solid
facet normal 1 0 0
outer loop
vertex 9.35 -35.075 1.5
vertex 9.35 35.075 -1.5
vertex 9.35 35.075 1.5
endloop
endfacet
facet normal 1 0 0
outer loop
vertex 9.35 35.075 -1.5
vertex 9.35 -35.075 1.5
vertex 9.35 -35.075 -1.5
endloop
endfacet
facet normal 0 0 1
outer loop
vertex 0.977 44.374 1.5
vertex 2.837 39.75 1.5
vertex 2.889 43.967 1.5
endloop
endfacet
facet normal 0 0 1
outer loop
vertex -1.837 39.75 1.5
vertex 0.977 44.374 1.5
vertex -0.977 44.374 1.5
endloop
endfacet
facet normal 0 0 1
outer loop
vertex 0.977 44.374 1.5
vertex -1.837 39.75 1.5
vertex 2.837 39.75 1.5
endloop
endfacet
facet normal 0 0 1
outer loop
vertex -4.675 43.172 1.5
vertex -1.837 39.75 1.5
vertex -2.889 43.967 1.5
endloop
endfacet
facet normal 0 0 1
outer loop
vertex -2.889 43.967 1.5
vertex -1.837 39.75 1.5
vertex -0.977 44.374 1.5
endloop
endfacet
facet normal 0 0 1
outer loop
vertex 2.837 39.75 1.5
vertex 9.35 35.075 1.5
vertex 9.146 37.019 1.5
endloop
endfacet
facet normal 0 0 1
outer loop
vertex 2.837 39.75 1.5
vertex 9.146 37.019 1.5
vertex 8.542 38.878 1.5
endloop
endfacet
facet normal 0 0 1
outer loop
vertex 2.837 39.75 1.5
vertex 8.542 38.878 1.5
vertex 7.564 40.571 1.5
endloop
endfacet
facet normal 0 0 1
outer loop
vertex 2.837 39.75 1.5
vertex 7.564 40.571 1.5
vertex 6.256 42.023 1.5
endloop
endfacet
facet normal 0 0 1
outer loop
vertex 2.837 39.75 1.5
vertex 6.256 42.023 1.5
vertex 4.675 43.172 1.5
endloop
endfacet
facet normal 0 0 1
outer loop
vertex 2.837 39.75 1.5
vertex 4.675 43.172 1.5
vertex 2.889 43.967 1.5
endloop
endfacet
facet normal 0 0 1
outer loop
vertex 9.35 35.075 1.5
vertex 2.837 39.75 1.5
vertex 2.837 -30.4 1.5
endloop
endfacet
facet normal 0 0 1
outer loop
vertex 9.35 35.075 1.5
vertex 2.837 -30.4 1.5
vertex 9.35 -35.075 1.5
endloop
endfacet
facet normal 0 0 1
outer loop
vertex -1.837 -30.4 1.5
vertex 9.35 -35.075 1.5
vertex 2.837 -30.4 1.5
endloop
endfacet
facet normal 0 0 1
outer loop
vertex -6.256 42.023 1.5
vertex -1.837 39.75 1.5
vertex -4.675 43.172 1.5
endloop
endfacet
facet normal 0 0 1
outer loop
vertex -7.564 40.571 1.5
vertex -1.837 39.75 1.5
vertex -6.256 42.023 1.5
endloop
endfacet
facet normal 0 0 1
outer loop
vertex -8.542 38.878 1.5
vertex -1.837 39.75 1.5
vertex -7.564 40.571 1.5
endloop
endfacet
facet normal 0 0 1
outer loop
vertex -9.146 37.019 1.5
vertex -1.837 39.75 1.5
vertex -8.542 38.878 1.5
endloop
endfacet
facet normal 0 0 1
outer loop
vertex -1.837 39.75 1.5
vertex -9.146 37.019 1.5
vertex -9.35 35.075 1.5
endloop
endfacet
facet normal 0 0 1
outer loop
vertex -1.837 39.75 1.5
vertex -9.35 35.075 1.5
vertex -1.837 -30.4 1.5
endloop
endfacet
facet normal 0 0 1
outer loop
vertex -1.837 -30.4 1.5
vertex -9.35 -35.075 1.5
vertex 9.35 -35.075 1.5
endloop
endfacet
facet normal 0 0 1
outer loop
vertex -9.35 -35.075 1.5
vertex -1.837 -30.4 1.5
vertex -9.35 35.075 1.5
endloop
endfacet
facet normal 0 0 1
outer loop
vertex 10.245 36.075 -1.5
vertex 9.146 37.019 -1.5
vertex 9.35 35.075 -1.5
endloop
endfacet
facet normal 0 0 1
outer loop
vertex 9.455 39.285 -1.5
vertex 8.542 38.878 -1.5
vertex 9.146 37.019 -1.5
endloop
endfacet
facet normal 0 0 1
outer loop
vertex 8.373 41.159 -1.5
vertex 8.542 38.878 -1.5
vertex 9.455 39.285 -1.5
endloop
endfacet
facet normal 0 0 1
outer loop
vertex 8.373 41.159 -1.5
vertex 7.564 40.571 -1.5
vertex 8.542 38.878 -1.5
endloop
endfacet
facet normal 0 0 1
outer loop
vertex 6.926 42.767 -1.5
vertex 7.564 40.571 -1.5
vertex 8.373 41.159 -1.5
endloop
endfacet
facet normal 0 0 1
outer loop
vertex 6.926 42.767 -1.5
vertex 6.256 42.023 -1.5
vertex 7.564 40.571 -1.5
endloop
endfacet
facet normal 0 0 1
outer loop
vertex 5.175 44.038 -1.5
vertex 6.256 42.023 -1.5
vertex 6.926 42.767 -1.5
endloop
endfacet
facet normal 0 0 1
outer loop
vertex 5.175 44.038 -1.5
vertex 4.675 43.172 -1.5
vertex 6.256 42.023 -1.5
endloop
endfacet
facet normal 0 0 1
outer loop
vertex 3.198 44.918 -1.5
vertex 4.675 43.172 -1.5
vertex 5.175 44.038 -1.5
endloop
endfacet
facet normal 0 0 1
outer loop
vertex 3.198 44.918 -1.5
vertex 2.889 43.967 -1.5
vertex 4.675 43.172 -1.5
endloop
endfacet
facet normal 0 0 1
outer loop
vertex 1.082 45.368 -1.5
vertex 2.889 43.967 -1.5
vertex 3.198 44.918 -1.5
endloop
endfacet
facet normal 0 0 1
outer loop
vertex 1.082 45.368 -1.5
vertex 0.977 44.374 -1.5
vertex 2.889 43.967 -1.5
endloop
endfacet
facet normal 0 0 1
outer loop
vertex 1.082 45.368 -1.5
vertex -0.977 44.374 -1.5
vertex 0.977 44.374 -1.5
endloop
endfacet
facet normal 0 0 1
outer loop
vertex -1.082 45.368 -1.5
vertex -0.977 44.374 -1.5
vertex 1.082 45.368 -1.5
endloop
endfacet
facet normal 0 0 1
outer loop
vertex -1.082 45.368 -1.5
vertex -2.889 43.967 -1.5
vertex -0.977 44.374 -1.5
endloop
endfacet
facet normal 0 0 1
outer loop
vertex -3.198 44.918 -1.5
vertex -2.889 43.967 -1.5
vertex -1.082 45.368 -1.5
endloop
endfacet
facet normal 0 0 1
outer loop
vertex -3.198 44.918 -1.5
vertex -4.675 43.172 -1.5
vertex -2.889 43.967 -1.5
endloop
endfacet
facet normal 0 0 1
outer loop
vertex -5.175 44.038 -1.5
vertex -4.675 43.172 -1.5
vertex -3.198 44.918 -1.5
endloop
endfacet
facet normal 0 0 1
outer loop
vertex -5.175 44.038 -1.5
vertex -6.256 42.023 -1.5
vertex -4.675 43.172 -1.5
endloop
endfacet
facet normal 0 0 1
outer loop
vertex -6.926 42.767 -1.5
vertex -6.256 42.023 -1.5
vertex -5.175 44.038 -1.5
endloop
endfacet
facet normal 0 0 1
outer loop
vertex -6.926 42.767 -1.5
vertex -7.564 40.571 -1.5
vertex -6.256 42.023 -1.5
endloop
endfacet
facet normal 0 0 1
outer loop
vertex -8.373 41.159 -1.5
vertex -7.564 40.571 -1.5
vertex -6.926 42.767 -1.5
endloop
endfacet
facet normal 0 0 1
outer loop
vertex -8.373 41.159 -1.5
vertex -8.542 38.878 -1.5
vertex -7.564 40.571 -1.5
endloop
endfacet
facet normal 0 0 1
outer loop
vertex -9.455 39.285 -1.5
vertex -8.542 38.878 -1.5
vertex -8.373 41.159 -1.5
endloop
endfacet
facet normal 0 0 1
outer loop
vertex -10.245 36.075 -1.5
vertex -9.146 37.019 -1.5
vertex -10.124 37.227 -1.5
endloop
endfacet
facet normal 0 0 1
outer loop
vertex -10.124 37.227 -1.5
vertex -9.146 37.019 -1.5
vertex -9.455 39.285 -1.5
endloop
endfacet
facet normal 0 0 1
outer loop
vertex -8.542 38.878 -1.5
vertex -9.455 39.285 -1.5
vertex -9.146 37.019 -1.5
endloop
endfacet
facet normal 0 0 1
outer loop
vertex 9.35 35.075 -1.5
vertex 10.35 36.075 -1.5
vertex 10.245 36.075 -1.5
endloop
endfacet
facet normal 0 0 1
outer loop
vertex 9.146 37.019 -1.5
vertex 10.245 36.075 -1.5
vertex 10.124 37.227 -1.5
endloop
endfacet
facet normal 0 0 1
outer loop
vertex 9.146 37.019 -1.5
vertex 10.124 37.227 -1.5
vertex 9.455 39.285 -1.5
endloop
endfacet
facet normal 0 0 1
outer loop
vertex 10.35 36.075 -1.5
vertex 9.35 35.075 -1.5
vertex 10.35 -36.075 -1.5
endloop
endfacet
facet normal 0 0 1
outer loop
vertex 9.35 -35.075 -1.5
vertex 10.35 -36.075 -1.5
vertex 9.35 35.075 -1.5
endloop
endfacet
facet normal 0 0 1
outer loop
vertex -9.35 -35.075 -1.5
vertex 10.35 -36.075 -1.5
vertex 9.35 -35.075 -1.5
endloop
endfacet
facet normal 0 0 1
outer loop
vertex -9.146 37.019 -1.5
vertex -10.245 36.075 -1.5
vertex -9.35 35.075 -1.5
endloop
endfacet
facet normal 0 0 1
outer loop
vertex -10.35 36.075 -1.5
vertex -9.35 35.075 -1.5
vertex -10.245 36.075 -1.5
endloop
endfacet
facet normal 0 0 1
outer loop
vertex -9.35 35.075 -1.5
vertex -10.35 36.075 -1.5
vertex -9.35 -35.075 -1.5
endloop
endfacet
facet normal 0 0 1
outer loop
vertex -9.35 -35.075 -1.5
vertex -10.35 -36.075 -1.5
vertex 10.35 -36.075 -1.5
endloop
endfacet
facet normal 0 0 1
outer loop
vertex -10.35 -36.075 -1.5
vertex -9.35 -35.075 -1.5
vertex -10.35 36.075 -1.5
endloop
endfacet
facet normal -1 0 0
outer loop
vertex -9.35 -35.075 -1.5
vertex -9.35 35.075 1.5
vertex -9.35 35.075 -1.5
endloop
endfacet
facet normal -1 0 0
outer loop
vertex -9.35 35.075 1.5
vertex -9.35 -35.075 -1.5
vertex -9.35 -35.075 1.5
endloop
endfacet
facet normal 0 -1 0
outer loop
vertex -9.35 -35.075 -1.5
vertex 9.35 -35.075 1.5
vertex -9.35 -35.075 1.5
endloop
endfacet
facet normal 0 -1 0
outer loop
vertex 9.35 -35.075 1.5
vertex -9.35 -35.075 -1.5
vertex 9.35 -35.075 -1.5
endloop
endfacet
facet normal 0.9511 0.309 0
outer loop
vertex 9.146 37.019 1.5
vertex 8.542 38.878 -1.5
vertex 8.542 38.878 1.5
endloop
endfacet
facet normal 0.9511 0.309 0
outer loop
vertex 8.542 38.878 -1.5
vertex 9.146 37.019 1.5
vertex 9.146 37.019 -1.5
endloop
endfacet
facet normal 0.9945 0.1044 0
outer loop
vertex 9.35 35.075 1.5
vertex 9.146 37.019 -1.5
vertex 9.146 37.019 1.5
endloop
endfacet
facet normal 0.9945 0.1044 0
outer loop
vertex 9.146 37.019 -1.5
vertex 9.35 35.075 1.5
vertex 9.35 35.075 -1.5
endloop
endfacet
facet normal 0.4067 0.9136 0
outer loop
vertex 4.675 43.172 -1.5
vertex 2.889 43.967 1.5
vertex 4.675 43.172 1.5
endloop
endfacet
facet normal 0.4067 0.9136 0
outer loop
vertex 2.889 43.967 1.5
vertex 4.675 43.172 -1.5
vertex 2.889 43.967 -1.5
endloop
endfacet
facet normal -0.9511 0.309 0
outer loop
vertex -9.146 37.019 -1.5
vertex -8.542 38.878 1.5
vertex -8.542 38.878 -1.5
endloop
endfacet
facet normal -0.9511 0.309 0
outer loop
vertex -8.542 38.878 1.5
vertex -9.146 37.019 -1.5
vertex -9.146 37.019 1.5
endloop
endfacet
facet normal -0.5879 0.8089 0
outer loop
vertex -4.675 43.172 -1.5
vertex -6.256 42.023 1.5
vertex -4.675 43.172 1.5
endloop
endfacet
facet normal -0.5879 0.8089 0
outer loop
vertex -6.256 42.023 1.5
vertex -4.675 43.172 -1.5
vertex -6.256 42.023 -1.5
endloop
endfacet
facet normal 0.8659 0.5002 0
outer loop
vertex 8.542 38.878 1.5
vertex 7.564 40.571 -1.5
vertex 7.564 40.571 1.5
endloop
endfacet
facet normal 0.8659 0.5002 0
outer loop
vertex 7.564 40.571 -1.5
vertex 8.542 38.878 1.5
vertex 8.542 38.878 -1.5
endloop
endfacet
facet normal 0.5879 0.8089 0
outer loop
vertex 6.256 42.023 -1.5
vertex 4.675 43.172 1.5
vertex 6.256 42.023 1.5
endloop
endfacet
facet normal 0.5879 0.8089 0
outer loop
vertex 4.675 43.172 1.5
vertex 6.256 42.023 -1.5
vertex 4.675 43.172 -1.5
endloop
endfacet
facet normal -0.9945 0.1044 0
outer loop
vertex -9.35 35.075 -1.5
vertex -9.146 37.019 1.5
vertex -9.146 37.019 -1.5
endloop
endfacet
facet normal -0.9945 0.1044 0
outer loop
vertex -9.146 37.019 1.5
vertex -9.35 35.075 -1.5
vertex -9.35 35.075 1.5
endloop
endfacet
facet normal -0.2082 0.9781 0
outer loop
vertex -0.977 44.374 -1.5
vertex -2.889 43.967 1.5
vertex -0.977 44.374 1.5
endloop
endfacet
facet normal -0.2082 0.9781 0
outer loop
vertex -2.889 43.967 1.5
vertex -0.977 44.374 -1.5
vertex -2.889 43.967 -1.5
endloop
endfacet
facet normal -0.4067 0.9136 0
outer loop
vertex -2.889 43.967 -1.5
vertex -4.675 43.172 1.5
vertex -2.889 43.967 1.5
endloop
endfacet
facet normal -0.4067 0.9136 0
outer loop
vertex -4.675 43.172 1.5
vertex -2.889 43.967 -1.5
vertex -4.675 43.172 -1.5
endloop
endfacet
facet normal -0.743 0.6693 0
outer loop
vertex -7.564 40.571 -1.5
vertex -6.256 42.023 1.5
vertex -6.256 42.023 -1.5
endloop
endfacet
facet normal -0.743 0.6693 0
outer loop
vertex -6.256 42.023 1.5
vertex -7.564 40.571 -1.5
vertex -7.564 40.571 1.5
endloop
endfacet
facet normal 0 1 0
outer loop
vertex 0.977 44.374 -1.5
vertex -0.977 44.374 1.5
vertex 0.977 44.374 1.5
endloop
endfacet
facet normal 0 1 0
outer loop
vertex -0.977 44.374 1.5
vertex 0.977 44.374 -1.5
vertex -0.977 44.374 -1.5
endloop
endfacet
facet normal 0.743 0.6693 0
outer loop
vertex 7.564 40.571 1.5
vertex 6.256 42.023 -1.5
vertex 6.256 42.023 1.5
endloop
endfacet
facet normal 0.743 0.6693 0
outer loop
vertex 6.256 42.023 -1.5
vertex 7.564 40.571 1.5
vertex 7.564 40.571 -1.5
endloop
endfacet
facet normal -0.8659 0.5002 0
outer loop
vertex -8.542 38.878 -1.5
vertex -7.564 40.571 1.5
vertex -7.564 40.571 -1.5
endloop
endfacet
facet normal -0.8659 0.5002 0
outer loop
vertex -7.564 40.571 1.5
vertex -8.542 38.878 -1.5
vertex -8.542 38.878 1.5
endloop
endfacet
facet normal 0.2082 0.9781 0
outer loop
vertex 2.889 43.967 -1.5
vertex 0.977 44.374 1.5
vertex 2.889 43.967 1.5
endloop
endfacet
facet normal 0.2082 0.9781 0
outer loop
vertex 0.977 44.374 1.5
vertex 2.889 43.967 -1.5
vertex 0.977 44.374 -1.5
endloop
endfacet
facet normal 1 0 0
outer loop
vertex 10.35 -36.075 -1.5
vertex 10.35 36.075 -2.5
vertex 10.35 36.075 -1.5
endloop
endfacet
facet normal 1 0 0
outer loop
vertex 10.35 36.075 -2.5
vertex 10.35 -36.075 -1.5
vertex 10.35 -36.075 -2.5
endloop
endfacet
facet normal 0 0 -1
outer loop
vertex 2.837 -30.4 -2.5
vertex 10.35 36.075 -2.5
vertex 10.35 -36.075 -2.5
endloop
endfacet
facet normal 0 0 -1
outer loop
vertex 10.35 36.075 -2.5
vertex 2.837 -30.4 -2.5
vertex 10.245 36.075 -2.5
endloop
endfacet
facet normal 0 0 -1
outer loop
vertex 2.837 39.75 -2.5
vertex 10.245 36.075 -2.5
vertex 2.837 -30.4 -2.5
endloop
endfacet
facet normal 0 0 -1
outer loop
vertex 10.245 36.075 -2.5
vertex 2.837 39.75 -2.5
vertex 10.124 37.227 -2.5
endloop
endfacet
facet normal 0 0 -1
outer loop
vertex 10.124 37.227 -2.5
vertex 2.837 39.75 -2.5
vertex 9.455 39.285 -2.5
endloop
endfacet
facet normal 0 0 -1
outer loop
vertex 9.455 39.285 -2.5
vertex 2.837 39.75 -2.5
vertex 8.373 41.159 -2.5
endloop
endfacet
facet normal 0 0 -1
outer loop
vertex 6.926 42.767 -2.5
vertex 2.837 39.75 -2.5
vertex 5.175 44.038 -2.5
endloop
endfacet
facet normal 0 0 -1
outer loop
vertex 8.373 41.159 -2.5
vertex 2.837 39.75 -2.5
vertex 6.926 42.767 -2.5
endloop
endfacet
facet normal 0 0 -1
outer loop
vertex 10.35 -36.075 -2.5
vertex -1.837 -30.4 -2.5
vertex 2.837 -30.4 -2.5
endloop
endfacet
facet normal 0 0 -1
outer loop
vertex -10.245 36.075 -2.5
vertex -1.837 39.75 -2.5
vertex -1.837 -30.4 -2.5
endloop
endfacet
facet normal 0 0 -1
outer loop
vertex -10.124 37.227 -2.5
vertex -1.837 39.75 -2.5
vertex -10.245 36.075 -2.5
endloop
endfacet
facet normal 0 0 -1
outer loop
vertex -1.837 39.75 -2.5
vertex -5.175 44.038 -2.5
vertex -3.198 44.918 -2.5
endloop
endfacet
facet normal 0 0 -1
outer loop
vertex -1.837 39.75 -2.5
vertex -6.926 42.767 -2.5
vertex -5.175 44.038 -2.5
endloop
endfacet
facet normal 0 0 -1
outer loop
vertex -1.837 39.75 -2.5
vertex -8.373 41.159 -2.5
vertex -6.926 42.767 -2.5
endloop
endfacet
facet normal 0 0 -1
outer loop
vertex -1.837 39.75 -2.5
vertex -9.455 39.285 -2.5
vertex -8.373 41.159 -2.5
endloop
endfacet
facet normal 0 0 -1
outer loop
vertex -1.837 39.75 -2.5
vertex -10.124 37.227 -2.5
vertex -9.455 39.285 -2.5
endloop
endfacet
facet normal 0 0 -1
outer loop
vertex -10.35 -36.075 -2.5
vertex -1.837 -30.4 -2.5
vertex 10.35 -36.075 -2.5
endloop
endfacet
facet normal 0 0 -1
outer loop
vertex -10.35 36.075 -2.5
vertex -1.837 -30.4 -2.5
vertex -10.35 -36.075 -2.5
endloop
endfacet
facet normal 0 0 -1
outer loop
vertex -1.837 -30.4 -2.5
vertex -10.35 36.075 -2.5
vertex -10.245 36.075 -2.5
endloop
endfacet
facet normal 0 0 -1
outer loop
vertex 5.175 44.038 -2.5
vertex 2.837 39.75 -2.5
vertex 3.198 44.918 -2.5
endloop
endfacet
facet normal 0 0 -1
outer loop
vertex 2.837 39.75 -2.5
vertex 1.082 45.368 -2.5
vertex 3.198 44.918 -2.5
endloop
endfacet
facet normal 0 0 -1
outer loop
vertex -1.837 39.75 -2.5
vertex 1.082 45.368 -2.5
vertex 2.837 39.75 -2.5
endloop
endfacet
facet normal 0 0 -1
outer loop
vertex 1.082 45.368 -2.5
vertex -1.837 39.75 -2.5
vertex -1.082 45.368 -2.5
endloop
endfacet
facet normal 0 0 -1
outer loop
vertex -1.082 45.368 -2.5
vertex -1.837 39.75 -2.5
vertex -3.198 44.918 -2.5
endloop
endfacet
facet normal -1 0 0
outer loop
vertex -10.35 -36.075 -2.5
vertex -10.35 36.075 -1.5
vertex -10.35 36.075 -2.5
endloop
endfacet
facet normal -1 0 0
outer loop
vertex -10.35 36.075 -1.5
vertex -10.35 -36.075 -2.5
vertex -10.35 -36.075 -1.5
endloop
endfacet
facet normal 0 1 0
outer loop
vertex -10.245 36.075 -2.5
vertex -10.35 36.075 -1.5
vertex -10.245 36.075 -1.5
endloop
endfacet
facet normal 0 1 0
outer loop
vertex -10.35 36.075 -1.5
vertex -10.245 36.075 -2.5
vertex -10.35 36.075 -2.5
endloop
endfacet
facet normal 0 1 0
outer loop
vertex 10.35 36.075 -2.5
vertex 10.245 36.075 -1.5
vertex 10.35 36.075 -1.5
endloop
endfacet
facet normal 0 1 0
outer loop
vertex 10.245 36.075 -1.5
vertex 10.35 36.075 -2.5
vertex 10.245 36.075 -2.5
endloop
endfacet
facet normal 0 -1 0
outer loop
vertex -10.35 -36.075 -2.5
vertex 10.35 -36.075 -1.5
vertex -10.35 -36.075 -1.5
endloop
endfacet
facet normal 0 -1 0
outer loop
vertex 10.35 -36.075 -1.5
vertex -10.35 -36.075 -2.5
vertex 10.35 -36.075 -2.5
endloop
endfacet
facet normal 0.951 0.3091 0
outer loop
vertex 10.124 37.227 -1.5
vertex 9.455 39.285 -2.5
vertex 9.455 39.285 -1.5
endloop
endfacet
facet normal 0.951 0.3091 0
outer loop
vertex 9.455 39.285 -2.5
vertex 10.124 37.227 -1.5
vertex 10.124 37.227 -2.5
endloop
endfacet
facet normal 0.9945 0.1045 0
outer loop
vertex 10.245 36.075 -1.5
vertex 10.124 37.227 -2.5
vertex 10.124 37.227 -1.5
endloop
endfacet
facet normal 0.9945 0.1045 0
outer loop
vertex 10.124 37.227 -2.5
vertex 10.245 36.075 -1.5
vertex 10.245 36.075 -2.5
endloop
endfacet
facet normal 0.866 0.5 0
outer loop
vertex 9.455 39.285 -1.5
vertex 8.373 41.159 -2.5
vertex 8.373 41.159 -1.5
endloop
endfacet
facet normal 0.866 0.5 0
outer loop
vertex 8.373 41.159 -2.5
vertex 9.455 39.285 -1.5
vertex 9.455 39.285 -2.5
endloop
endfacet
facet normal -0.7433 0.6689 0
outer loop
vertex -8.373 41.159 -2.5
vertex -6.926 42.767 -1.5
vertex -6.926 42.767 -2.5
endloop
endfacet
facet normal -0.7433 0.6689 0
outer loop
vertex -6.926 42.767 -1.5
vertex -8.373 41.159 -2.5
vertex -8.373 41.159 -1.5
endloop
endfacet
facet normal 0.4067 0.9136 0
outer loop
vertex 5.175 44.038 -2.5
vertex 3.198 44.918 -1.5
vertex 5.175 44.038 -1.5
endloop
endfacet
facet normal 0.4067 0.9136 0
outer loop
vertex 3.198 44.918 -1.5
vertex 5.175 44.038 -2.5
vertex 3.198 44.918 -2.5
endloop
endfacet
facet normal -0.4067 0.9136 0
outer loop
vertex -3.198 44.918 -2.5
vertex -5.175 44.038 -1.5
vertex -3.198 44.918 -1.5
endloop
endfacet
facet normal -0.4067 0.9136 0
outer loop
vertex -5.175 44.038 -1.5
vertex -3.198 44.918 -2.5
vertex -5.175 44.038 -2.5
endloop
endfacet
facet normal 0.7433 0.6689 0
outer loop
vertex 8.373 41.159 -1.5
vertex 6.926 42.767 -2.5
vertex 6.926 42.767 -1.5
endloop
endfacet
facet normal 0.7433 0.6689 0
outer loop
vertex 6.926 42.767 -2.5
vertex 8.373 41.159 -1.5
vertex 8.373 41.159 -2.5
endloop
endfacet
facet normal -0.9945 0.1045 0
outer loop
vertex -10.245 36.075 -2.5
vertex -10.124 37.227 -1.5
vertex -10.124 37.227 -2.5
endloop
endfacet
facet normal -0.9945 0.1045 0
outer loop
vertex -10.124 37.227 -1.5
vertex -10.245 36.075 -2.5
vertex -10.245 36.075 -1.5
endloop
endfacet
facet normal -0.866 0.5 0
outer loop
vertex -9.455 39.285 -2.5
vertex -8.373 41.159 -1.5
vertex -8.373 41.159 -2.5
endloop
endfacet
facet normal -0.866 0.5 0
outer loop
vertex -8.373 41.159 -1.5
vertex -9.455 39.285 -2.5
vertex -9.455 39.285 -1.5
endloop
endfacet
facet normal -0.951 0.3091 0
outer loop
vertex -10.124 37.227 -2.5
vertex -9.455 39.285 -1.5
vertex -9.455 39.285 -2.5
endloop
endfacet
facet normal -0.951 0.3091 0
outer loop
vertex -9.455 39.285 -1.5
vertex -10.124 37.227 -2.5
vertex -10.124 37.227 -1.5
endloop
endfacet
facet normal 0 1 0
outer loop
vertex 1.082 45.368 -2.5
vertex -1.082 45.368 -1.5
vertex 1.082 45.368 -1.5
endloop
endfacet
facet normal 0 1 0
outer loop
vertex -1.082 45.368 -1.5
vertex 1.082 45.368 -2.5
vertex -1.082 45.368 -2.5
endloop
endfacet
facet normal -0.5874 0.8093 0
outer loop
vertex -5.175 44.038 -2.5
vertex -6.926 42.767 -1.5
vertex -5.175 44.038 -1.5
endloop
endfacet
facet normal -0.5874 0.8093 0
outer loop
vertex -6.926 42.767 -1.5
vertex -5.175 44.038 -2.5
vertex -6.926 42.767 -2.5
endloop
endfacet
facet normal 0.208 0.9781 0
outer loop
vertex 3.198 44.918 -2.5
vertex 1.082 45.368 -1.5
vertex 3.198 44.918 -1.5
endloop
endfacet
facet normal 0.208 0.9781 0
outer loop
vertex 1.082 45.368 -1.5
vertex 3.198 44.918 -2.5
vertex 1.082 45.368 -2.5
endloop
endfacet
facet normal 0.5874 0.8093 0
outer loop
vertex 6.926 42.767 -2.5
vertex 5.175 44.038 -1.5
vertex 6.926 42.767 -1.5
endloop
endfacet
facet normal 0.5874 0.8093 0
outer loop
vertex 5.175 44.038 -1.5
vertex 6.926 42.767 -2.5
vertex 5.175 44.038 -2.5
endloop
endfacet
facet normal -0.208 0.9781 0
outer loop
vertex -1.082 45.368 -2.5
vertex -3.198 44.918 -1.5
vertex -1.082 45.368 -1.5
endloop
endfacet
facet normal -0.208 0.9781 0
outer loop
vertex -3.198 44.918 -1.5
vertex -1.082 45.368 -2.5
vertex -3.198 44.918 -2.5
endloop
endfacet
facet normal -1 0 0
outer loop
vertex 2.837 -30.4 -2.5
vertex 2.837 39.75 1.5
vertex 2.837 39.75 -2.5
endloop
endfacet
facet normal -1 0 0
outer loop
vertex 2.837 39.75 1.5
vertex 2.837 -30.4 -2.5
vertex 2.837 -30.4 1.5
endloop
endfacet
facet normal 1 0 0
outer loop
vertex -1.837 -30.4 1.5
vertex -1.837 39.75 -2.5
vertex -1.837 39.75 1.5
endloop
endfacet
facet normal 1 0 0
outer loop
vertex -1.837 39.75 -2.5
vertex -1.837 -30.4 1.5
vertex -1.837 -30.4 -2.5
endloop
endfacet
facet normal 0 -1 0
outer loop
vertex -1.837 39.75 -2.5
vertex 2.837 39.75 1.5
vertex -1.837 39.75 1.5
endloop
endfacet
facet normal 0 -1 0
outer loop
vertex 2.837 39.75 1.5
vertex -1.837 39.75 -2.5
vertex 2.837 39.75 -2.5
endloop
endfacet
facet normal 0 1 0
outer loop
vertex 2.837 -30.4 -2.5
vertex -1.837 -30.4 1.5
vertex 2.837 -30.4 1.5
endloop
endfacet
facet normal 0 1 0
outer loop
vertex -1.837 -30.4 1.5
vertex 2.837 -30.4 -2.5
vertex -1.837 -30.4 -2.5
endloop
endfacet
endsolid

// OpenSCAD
width = 18.7;
total_length = 79.5;
thickness = 3;
slit_width = 1/8 * 25.4 + 1.5;
slit_adjust = +0.5;

module shadow_mask() {
    length = total_length - width/2;
    module body() {
        cube([width, length, thickness], center = true);
    
        translate([0, length/2, 0])
        cylinder(d = width, h = thickness, center = true);
        
        translate([0, 0, -thickness/2 -1/2])
        cube([width + 2, length + 2, 1], center = true);
        
        translate([0, length/2, -thickness/2 -1/2])
        cylinder(d = width + 2, h = 1, center = true);
    }
   
    difference() {
        body();
        translate([slit_adjust, width/4, 0])
        cube([slit_width, length, thickness + 5.2], center=true);
    }
}

shadow_mask();
